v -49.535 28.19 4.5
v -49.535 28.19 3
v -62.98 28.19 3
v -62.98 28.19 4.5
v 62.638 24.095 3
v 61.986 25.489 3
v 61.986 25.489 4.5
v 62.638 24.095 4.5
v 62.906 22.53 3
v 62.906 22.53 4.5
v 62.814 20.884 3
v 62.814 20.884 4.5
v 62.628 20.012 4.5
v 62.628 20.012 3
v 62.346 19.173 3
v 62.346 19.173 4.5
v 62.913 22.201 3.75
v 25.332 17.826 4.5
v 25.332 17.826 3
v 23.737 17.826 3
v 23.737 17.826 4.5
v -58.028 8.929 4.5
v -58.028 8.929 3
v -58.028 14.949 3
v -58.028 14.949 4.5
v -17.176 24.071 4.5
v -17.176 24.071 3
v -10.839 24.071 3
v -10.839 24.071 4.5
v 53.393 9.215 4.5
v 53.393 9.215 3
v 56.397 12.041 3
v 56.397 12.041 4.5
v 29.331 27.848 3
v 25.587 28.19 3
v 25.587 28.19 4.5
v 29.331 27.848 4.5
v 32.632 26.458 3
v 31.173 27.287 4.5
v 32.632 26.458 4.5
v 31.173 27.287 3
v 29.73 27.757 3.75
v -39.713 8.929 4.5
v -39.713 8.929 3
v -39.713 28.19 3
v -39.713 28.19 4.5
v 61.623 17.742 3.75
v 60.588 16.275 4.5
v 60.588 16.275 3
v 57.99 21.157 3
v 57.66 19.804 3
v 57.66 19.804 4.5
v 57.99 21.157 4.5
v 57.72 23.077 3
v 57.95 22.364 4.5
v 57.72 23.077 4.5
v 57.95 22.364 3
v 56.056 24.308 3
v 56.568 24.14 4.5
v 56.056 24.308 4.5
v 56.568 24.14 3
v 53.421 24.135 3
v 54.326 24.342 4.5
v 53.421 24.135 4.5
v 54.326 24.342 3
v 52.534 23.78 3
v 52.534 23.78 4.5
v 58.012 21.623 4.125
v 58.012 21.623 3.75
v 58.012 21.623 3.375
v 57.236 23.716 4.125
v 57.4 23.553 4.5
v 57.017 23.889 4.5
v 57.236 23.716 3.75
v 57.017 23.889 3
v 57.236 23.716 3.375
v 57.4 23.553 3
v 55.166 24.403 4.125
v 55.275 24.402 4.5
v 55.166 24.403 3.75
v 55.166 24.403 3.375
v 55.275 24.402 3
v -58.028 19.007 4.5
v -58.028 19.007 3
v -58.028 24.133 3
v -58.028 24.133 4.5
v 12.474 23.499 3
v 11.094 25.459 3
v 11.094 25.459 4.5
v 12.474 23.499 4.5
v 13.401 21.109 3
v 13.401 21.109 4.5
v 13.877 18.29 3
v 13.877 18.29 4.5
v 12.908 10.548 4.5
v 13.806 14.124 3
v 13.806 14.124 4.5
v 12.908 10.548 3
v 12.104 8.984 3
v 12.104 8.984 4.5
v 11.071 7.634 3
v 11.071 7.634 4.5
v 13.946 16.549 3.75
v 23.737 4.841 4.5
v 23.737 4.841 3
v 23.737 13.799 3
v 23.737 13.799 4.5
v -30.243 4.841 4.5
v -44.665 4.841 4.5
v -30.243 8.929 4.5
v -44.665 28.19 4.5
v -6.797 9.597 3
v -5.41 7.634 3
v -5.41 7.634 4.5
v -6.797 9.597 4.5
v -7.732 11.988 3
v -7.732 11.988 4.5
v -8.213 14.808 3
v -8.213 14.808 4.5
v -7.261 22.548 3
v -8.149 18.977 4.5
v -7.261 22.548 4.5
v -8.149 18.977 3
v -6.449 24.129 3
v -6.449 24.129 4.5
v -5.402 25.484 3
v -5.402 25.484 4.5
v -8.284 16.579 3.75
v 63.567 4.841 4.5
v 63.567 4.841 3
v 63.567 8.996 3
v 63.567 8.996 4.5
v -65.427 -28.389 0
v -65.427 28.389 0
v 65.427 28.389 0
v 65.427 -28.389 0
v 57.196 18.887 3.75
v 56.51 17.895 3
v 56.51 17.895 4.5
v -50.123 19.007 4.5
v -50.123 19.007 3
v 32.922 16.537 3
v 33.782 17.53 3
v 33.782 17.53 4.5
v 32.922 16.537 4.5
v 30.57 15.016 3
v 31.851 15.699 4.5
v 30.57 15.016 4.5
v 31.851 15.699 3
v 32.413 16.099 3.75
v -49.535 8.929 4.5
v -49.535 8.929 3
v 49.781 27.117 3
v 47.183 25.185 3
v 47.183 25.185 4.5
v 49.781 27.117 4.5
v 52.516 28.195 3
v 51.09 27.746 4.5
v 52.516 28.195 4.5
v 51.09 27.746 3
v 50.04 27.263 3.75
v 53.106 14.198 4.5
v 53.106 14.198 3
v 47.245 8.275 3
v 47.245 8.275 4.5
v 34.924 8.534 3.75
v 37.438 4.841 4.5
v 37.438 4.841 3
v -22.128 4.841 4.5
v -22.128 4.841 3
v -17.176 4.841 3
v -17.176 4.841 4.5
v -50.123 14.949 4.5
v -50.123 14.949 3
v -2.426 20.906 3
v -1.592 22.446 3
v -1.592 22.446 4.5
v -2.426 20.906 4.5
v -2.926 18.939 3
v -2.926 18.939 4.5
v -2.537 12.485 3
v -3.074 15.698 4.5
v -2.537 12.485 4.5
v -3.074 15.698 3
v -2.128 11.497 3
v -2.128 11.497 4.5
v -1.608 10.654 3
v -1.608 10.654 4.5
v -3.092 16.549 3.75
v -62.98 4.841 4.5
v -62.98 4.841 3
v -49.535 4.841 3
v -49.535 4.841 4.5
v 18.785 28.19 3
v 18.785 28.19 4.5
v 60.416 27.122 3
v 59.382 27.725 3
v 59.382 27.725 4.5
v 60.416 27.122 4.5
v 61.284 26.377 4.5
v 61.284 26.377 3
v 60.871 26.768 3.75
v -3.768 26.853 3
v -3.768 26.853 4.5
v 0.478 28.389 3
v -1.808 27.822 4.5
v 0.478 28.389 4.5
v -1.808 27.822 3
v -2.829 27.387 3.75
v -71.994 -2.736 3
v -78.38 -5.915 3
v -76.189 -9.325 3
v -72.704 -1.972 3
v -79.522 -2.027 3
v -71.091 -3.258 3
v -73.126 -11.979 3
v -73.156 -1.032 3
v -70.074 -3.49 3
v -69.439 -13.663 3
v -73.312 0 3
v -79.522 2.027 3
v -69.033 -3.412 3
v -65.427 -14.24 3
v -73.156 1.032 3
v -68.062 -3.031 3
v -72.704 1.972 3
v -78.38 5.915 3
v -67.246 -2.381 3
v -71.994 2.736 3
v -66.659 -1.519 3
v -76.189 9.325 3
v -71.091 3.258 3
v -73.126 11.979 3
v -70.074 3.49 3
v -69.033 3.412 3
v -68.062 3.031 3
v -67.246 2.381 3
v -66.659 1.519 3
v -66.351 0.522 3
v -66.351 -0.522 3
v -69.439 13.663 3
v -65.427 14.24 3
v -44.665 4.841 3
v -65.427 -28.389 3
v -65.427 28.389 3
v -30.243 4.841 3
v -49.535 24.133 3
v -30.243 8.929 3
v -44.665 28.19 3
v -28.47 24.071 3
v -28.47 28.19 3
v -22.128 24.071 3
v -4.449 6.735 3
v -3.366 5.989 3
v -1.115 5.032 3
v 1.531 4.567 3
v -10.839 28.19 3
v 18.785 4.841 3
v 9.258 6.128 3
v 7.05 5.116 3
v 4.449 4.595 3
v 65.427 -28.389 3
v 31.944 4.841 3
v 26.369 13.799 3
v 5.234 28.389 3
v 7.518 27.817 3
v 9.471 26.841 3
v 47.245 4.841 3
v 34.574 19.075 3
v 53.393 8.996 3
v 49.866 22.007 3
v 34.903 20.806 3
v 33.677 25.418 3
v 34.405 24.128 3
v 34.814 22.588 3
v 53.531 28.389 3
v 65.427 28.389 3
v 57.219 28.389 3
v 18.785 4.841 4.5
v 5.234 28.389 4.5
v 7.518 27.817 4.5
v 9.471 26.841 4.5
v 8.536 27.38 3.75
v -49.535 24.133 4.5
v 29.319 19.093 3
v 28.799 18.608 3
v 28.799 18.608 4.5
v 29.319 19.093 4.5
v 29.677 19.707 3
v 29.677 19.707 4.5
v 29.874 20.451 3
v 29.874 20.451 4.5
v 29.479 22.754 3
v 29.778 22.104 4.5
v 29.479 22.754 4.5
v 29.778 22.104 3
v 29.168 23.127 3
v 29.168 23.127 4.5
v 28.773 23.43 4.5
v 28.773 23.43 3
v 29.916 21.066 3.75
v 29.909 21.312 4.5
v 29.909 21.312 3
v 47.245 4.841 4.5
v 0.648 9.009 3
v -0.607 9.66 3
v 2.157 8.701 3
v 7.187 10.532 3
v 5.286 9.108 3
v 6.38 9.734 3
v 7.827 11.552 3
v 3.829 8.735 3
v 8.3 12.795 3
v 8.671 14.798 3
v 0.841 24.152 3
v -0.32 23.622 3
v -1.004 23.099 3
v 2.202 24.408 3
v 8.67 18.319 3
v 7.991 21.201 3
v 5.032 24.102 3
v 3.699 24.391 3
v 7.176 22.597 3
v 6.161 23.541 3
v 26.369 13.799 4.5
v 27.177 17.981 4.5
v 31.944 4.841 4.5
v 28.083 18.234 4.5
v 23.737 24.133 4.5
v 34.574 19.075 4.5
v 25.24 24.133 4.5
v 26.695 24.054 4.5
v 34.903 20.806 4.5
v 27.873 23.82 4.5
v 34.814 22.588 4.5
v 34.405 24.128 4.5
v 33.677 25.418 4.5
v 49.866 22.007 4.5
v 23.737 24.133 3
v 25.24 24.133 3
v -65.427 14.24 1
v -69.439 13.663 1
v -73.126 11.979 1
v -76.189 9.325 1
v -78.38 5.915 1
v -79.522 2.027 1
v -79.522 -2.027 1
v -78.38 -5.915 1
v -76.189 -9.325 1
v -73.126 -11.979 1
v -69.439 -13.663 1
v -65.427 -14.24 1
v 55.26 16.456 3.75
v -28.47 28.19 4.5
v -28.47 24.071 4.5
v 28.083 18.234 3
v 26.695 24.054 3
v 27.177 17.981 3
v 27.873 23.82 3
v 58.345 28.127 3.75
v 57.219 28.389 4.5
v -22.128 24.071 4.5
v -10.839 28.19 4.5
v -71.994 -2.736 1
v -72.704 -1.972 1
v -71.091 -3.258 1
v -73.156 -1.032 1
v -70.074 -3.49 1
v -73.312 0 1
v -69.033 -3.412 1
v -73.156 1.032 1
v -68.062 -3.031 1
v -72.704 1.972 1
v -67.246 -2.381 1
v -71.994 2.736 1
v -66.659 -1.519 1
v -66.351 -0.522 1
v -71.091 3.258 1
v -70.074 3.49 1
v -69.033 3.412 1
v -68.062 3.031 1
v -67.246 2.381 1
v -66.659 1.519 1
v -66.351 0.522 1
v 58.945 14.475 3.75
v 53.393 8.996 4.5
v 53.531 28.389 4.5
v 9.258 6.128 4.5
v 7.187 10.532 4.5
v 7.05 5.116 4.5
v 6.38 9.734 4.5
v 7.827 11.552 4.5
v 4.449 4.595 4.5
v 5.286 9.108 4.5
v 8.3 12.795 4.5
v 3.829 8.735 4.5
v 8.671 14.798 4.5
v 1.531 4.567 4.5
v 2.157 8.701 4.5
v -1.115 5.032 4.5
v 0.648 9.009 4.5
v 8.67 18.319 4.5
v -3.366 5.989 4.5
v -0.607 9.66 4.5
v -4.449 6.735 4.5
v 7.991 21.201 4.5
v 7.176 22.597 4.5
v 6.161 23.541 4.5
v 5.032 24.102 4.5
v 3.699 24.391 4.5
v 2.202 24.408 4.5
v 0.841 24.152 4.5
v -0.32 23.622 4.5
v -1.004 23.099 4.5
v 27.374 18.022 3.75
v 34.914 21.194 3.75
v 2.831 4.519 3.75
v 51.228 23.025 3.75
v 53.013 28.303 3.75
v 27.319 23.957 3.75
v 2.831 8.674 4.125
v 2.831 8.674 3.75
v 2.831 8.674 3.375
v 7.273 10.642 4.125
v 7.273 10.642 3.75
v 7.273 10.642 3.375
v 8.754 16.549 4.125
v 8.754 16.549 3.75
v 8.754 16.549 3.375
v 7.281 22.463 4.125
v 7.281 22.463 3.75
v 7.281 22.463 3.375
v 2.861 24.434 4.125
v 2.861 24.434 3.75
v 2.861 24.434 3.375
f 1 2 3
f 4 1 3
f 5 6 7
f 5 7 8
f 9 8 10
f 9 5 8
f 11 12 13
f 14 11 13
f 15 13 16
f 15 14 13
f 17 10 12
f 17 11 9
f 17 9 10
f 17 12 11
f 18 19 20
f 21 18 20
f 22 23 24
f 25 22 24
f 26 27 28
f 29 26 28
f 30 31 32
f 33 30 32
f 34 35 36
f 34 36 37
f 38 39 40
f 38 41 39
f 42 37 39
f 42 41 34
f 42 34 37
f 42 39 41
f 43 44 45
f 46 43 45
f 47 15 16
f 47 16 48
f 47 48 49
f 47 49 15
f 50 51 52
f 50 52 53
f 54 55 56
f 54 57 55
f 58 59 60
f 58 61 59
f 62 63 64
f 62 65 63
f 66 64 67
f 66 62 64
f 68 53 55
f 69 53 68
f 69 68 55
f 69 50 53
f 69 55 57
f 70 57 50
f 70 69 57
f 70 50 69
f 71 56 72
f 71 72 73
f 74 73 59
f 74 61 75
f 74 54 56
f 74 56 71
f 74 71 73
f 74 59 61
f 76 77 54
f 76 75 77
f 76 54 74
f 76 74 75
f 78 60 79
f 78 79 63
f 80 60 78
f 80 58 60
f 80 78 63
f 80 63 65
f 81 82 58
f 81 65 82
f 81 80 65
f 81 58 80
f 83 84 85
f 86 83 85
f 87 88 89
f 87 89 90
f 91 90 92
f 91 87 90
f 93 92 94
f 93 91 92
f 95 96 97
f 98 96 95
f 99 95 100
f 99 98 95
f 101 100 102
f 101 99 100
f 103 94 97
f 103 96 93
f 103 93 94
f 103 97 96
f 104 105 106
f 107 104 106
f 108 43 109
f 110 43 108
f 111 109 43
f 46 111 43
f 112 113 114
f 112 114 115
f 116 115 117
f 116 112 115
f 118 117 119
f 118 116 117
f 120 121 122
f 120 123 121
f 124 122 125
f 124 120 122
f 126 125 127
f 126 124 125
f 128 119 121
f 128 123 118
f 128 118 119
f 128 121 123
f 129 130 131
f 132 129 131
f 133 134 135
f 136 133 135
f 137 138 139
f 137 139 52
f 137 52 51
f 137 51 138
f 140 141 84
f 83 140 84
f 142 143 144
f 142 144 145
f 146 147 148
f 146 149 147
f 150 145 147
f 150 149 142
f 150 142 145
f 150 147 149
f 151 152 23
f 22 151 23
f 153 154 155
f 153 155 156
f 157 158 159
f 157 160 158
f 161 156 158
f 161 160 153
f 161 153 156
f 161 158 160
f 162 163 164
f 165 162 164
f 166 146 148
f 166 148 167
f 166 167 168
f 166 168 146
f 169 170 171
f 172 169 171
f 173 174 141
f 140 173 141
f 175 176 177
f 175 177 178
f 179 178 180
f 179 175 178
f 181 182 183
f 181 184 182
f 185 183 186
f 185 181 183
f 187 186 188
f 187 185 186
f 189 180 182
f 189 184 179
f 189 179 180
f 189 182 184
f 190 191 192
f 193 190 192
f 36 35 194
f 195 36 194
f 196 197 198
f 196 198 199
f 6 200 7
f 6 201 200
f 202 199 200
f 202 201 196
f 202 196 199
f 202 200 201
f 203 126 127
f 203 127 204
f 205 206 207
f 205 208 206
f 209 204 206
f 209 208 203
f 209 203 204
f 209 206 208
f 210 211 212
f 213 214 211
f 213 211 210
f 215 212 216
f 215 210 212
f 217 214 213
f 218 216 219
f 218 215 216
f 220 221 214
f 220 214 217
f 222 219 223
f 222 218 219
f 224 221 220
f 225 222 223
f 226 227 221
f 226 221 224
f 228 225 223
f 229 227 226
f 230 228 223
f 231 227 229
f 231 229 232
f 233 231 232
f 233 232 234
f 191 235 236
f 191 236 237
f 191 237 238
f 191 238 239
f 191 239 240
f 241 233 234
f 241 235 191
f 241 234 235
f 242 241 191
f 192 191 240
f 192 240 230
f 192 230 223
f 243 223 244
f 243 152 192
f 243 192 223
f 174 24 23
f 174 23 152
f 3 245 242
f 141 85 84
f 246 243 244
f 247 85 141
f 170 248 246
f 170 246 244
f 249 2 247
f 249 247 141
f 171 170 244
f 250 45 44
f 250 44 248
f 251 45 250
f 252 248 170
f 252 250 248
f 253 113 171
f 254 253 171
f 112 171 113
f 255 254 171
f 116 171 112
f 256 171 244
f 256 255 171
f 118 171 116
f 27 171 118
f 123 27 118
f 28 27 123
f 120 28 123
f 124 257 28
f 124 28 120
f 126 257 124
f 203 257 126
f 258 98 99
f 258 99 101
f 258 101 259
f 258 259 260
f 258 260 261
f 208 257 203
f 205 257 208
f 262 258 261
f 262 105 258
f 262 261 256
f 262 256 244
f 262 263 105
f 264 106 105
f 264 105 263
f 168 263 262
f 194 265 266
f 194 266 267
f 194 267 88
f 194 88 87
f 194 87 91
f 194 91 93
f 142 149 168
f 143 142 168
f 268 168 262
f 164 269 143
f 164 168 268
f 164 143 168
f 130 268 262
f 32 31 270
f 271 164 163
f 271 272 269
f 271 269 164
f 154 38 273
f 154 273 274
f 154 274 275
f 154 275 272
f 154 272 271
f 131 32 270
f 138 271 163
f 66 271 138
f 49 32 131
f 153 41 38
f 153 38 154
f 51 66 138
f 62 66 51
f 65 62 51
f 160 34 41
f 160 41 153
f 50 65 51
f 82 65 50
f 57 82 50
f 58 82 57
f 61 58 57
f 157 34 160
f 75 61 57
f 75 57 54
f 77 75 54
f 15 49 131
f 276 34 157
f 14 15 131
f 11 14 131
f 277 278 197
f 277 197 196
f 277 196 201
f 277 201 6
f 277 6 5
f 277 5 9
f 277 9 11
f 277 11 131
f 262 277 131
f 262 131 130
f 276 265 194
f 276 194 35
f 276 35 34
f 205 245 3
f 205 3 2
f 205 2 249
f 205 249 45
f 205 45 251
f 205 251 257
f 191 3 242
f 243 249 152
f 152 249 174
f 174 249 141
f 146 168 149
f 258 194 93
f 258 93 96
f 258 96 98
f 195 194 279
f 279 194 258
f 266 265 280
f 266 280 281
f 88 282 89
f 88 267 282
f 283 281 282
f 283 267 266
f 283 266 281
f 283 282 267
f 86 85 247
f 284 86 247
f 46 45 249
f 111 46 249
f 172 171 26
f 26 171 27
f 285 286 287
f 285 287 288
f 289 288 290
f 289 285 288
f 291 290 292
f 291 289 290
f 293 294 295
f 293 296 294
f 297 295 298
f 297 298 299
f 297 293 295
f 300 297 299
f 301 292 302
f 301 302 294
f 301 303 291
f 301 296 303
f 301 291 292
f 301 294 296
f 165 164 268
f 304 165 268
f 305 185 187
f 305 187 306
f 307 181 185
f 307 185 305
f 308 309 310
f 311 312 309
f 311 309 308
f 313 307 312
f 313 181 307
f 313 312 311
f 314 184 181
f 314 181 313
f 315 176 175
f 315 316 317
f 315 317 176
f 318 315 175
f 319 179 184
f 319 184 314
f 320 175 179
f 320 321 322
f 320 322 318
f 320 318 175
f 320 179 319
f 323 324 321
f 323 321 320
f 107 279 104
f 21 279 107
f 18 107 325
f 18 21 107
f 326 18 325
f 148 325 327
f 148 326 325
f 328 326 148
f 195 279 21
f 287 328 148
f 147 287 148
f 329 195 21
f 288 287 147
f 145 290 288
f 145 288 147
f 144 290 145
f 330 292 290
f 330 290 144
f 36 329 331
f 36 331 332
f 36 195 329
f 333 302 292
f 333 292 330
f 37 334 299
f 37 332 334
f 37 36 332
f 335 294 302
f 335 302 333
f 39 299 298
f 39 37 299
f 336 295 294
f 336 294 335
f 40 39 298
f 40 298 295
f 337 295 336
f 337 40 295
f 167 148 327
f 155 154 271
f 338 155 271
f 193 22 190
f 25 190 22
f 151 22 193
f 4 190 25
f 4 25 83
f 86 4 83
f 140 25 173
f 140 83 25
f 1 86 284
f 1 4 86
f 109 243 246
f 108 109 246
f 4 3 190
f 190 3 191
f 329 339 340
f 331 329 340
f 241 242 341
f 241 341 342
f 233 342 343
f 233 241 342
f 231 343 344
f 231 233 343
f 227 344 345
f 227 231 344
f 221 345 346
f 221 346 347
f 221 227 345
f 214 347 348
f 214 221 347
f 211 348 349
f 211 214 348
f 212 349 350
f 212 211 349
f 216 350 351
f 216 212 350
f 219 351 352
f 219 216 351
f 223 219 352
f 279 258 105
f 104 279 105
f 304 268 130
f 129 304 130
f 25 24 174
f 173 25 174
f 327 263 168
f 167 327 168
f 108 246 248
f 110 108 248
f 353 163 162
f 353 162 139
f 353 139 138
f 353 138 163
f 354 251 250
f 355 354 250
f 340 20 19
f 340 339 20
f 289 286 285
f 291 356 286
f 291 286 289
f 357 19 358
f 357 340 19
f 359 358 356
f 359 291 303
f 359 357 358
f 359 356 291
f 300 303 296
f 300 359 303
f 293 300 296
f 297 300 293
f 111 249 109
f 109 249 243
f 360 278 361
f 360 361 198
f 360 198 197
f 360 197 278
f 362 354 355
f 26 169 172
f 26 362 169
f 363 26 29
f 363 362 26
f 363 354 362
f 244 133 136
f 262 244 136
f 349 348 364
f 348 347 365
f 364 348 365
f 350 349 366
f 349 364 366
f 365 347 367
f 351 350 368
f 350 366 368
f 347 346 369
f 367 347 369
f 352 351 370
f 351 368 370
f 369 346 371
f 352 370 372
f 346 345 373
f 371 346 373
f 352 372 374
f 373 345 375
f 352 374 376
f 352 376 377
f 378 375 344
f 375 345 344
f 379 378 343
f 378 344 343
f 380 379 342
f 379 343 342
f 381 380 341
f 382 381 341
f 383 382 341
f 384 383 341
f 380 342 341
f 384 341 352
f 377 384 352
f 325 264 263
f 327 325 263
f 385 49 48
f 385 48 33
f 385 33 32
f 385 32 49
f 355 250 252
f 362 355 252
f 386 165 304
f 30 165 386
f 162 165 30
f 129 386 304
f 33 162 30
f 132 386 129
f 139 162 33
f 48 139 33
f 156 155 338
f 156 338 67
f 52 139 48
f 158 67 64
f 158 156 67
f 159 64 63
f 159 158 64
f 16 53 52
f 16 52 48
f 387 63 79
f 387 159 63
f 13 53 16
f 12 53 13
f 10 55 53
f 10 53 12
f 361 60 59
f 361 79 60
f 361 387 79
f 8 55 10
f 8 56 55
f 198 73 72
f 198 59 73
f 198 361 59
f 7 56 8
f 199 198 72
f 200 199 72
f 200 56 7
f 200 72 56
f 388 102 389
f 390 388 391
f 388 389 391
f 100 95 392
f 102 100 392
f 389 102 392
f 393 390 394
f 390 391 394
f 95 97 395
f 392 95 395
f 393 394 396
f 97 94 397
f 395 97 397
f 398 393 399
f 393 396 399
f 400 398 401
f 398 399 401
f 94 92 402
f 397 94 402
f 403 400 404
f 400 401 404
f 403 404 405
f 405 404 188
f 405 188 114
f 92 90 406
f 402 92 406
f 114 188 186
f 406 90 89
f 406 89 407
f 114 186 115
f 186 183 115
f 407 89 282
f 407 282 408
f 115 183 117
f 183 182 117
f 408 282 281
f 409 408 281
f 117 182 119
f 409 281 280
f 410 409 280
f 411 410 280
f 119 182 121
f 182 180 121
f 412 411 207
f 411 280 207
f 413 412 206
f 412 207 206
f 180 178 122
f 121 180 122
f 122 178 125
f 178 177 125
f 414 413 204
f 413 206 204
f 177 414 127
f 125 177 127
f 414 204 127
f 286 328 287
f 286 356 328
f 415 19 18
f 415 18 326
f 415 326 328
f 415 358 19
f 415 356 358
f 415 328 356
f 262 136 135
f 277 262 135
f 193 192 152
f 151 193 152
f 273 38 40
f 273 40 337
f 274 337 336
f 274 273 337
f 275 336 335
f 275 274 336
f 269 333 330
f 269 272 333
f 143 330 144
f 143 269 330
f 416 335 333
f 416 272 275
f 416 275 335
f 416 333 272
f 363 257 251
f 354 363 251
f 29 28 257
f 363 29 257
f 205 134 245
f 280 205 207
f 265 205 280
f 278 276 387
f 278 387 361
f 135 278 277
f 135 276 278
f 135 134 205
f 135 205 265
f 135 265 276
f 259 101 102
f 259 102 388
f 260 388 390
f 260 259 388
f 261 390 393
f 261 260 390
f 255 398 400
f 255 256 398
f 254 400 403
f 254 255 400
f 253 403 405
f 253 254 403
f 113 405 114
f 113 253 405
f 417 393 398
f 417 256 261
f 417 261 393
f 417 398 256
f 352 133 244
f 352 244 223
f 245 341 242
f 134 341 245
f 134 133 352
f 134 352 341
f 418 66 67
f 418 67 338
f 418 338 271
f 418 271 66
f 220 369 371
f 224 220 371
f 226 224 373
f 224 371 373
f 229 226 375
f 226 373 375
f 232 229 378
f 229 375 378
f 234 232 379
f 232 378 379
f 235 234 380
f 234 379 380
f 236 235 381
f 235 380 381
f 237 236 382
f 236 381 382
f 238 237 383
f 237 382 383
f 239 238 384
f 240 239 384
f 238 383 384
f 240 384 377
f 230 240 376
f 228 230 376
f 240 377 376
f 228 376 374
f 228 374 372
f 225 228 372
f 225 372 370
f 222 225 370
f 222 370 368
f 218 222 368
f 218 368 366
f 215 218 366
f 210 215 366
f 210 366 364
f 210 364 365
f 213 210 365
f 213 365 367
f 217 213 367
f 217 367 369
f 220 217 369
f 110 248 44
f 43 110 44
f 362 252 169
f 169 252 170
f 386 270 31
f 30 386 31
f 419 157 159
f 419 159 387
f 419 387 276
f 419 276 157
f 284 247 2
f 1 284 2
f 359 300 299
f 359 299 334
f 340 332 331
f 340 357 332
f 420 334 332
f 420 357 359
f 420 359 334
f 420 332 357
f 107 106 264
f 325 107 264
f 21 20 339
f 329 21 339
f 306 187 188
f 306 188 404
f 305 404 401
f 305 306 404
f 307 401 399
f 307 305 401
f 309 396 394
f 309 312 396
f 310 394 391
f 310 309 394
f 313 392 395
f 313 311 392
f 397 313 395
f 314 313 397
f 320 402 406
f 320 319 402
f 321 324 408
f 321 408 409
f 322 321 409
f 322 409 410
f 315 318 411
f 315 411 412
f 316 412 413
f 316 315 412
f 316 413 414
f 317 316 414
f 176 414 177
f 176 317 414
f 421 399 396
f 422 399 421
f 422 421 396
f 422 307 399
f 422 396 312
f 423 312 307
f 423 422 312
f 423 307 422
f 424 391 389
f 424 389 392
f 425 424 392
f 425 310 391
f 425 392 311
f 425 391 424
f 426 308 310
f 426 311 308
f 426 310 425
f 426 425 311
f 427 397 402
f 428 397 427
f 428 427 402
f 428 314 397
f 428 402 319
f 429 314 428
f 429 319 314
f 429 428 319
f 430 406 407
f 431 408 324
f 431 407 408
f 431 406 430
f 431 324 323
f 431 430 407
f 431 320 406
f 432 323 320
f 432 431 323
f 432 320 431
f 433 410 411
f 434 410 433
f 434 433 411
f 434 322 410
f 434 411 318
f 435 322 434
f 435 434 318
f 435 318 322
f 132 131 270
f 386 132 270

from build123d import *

# Parameters (mm, degrees)
F0_W     = 130.8541893959
F0_H     = 56.7789375782
F1_DEPTH = 3
F3_DEPTH = 1.5
F4_R     = 14.2398683788
F5_DEPTH = 2
F7_D     = 7


# Not quite as in the source:
# - a feature names something its author has since deleted; it is built from what else it names


with BuildPart() as f1:
    # F0 (on Top) → F1 (new body)
    with BuildSketch(Plane.XY):
        Rectangle(F0_W, F0_H)
    extrude(amount=F1_DEPTH)

    # F2 (on face) → F3 (join)
    with BuildSketch(Plane.XY.offset(3)):
        with BuildLine():
            Line((57.2191747598, 28.3894687891), (53.5310418569, 28.3894687891))
            add(Edge.make_bspline(
                [(52.5161502643, 28.1952754595), (53.0025964919, 28.3138756826), (53.5310418569, 28.3894687891)],
                knots=[0, 0, 0, 0.3626225608, 0.3626225608, 0.3626225608], degree=2))
            add(Edge.make_bspline(
                [(50.0401853118, 27.2626364423), (51.1746831848, 27.8682130096), (52.5161502643, 28.1952754595)],
                knots=[0, 0, 0, 1, 1, 1], degree=2))
            add(Edge.make_bspline(
                [(47.1834992262, 25.1852788506), (48.9056874388, 26.657059875), (50.0401853118, 27.2626364423)],
                knots=[0, 0, 0, 1, 1, 1], degree=2))
            Line((47.1834992262, 25.1852788506), (49.8664333853, 22.0066406659))
            add(Edge.make_bspline(
                [(52.534036492, 23.7799323863), (51.2564487973, 23.1564695912), (49.8664333853, 22.0066406659)],
                knots=[0, 0, 0, 1, 1, 1], degree=2))
            add(Edge.make_bspline(
                [(55.1658671433, 24.4033951813), (53.8116241868, 24.4033951813), (52.534036492, 23.7799323863)],
                knots=[0, 0, 0, 1, 1, 1], degree=2))
            add(Edge.make_bspline(
                [(57.2355592089, 23.7160530015), (56.4587858905, 24.4033951813), (55.1658671433, 24.4033951813)],
                knots=[0, 0, 0, 1, 1, 1], degree=2))
            add(Edge.make_bspline(
                [(58.0123325273, 21.6233643575), (58.0123325273, 23.0287108217), (57.2355592089, 23.7160530015)],
                knots=[0, 0, 0, 1, 1, 1], degree=2))
            add(Edge.make_bspline(
                [(57.6597183236, 19.8040794801), (58.0123325273, 20.6830598141), (58.0123325273, 21.6233643575)],
                knots=[0, 0, 0, 1, 1, 1], degree=2))
            add(Edge.make_bspline(
                [(56.5098893983, 17.8953634641), (57.3071041198, 18.9250991461), (57.6597183236, 19.8040794801)],
                knots=[0, 0, 0, 1, 1, 1], degree=2))
            add(Edge.make_bspline(
                [(53.1063957793, 14.1980246753), (55.7126746767, 16.865627782), (56.5098893983, 17.8953634641)],
                knots=[0, 0, 0, 1, 1, 1], degree=2))
            Line((53.1063957793, 14.1980246753), (47.2448234356, 8.2751281222))
            Line((47.2448234356, 8.2751281222), (47.2448234356, 4.8409723986))
            Line((47.2448234356, 4.8409723986), (63.5672838243, 4.8409723986))
            Line((63.5672838243, 4.8409723986), (63.5672838243, 8.9956875821))
            Line((63.5672838243, 8.9956875821), (53.3925754229, 8.9956875821))
            Line((53.3925754229, 8.9956875821), (53.3925754229, 9.2154326656))
            Line((53.3925754229, 9.2154326656), (56.3974616811, 12.0414566465))
            add(Edge.make_bspline(
                [(60.58794932, 16.2753822671), (59.3972375885, 14.7908253657), (56.3974616811, 12.0414566465)],
                knots=[0, 0, 0, 1, 1, 1], degree=2))
            add(Edge.make_bspline(
                [(62.3459099881, 19.1729511588), (61.7786610516, 17.7599391684), (60.58794932, 16.2753822671)],
                knots=[0, 0, 0, 1, 1, 1], degree=2))
            add(Edge.make_bspline(
                [(62.9131589246, 22.2008339955), (62.9131589246, 20.5859631493), (62.3459099881, 19.1729511588)],
                knots=[0, 0, 0, 1, 1, 1], degree=2))
            add(Edge.make_bspline(
                [(61.9856302581, 25.4893447219), (62.9131589246, 24.0507809776), (62.9131589246, 22.2008339955)],
                knots=[0, 0, 0, 1, 1, 1], degree=2))
            add(Edge.make_bspline(
                [(59.3819065362, 27.7251231878), (61.0581015917, 26.9279084663), (61.9856302581, 25.4893447219)],
                knots=[0, 0, 0, 1, 1, 1], degree=2))
            add(Edge.make_bspline(
                [(57.2191747598, 28.3894687891), (58.3900152465, 28.1968763622), (59.3819065362, 27.7251231878)],
                knots=[0.4082482905, 0.4082482905, 0.4082482905, 1, 1, 1], degree=2))
        make_face()
        with BuildLine():
            Line((23.7372098514, 4.8409723986), (23.7372098514, 13.7994173145))
            Line((23.7372098514, 13.7994173145), (26.3690405026, 13.7994173145))
            Line((26.3690405026, 13.7994173145), (31.9444332027, 4.8409723986))
            Line((31.9444332027, 4.8409723986), (37.4380602903, 4.8409723986))
            add(Edge.make_bspline(
                [(30.5697488431, 15.0156808), (35.8436308472, 7.1406302493), (37.4380602903, 4.8409723986)],
                knots=[0, 0, 0, 1, 1, 1], degree=2))
            add(Edge.make_bspline(
                [(33.7816043078, 17.5299733833), (32.6496616103, 15.9253232387), (30.5697488431, 15.0156808)],
                knots=[0, 0, 0, 1, 1, 1], degree=2))
            add(Edge.make_bspline(
                [(34.9135470054, 21.194094892), (34.9135470054, 19.134623528), (33.7816043078, 17.5299733833)],
                knots=[0, 0, 0, 1, 1, 1], degree=2))
            add(Edge.make_bspline(
                [(32.6317753825, 26.4577561946), (34.9135470054, 24.7253472804), (34.9135470054, 21.194094892)],
                knots=[0, 0, 0, 1, 1, 1], degree=2))
            add(Edge.make_bspline(
                [(25.5871568334, 28.1901651087), (30.3500037596, 28.1901651087), (32.6317753825, 26.4577561946)],
                knots=[0, 0, 0, 1, 1, 1], degree=2))
            Line((25.5871568334, 28.1901651087), (18.7852799463, 28.1901651087))
            Line((18.7852799463, 28.1901651087), (18.7852799463, 4.8409723986))
            Line((18.7852799463, 4.8409723986), (23.7372098514, 4.8409723986))
        make_face()
        with BuildLine():
            Line((25.3316392945, 17.8263737285), (23.7372098514, 17.8263737285))
            Line((23.7372098514, 17.8263737285), (23.7372098514, 24.13254659))
            Line((23.7372098514, 24.13254659), (25.2396529804, 24.13254659))
            add(Edge.make_bspline(
                [(28.7734605442, 23.4298733579), (27.6312971451, 24.13254659), (25.2396529804, 24.13254659)],
                knots=[0, 0, 0, 1, 1, 1], degree=2))
            add(Edge.make_bspline(
                [(29.9156239434, 21.0663361225), (29.9156239434, 22.7272001258), (28.7734605442, 23.4298733579)],
                knots=[0, 0, 0, 1, 1, 1], degree=2))
            add(Edge.make_bspline(
                [(28.7990122981, 18.6082573977), (29.9156239434, 19.390141067), (29.9156239434, 21.0663361225)],
                knots=[0, 0, 0, 1, 1, 1], degree=2))
            add(Edge.make_bspline(
                [(25.3316392945, 17.8263737285), (27.6824006529, 17.8263737285), (28.7990122981, 18.6082573977)],
                knots=[0, 0, 0, 1, 1, 1], degree=2))
        make_face(mode=Mode.SUBTRACT)
        with BuildLine():
            add(Edge.make_bspline(
                [(13.9457777584, 16.5487860337), (13.9457777584, 10.7485378994), (11.0712054452, 7.6337790995)],
                knots=[0, 0, 0, 1, 1, 1], degree=2))
            add(Edge.make_bspline(
                [(11.0942020237, 25.4586826172), (13.9457777584, 22.3592548697), (13.9457777584, 16.5487860337)],
                knots=[0, 0, 0, 1, 1, 1], degree=2))
            add(Edge.make_bspline(
                [(5.2342333213, 28.3894687891), (8.9077868298, 27.8351356909), (11.0942020237, 25.4586826172)],
                knots=[0.2332606961, 0.2332606961, 0.2332606961, 1, 1, 1], degree=2))
            Line((5.2342333213, 28.3894687891), (0.4776699233, 28.3894687891))
            add(Edge.make_bspline(
                [(-5.4020102915, 25.4842343711), (-3.1948737915, 27.8381219683), (0.4776699233, 28.3894687891)],
                knots=[0, 0, 0, 0.7657718145, 0.7657718145, 0.7657718145], degree=2))
            add(Edge.make_bspline(
                [(-8.284248131, 16.5794481384), (-8.284248131, 22.4103583775), (-5.4020102915, 25.4842343711)],
                knots=[0, 0, 0, 1, 1, 1], degree=2))
            add(Edge.make_bspline(
                [(-5.4096758177, 7.6337790995), (-8.284248131, 10.7485378994), (-8.284248131, 16.5794481384)],
                knots=[0, 0, 0, 1, 1, 1], degree=2))
            add(Edge.make_bspline(
                [(2.8307648137, 4.5190202995), (-2.5351035044, 4.5190202995), (-5.4096758177, 7.6337790995)],
                knots=[0, 0, 0, 1, 1, 1], degree=2))
            add(Edge.make_bspline(
                [(11.0712054452, 7.6337790995), (8.1966331319, 4.5190202995), (2.8307648137, 4.5190202995)],
                knots=[0, 0, 0, 1, 1, 1], degree=2))
        make_face()
        with BuildLine():
            add(Edge.make_bspline(
                [(-3.0921317393, 16.5487860337), (-3.0921317393, 12.6342573369), (-1.607574838, 10.65399641)],
                knots=[0, 0, 0, 1, 1, 1], degree=2))
            add(Edge.make_bspline(
                [(-1.5922437857, 22.4461308329), (-3.0921317393, 20.4582043798), (-3.0921317393, 16.5487860337)],
                knots=[0, 0, 0, 1, 1, 1], degree=2))
            add(Edge.make_bspline(
                [(2.8614269184, 24.434057286), (-0.092355832, 24.434057286), (-1.5922437857, 22.4461308329)],
                knots=[0, 0, 0, 1, 1, 1], degree=2))
            add(Edge.make_bspline(
                [(8.7536613668, 16.5487860337), (8.7536613668, 24.434057286), (2.8614269184, 24.434057286)],
                knots=[0, 0, 0, 1, 1, 1], degree=2))
            add(Edge.make_bspline(
                [(2.8307648137, 8.673735483), (8.7536613668, 8.673735483), (8.7536613668, 16.5487860337)],
                knots=[0, 0, 0, 1, 1, 1], degree=2))
            add(Edge.make_bspline(
                [(-1.607574838, 10.65399641), (-0.1230179366, 8.673735483), (2.8307648137, 8.673735483)],
                knots=[0, 0, 0, 1, 1, 1], degree=2))
        make_face(mode=Mode.SUBTRACT)
        Polygon((-22.1281883918, 4.8409723986), (-17.1762584868, 4.8409723986), (-17.1762584868, 24.0712223807), (-10.8394235206, 24.0712223807), (-10.8394235206, 28.1901651087), (-28.4701337088, 28.1901651087), (-28.4701337088, 24.0712223807), (-22.1281883918, 24.0712223807), align=None)
        Polygon((-44.664835328, 28.1901651087), (-44.664835328, 4.8409723986), (-30.2434254291, 4.8409723986), (-30.2434254291, 8.929253022), (-39.712905423, 8.929253022), (-39.712905423, 28.1901651087), align=None)
        Polygon((-62.9803325206, 4.8409723986), (-49.5349996205, 4.8409723986), (-49.5349996205, 8.929253022), (-58.0284026155, 8.929253022), (-58.0284026155, 14.9492462399), (-50.1226899601, 14.9492462399), (-50.1226899601, 19.0068647585), (-58.0284026155, 19.0068647585), (-58.0284026155, 24.13254659), (-49.5349996205, 24.13254659), (-49.5349996205, 28.1901651087), (-62.9803325206, 28.1901651087), align=None)
    extrude(amount=F3_DEPTH)

    # F4 (on face) → F5 (join)
    with BuildSketch(Plane.XY.offset(3)):
        with Locations((-65.427094698, 0)):
            Circle(F4_R)
    extrude(amount=-F5_DEPTH)

    # F7 (through all)
    with Locations(Plane.XY.offset(3)):
        with Locations((-69.8119476438, 0)):
            Hole(F7_D / 2)


solid = f1.part
